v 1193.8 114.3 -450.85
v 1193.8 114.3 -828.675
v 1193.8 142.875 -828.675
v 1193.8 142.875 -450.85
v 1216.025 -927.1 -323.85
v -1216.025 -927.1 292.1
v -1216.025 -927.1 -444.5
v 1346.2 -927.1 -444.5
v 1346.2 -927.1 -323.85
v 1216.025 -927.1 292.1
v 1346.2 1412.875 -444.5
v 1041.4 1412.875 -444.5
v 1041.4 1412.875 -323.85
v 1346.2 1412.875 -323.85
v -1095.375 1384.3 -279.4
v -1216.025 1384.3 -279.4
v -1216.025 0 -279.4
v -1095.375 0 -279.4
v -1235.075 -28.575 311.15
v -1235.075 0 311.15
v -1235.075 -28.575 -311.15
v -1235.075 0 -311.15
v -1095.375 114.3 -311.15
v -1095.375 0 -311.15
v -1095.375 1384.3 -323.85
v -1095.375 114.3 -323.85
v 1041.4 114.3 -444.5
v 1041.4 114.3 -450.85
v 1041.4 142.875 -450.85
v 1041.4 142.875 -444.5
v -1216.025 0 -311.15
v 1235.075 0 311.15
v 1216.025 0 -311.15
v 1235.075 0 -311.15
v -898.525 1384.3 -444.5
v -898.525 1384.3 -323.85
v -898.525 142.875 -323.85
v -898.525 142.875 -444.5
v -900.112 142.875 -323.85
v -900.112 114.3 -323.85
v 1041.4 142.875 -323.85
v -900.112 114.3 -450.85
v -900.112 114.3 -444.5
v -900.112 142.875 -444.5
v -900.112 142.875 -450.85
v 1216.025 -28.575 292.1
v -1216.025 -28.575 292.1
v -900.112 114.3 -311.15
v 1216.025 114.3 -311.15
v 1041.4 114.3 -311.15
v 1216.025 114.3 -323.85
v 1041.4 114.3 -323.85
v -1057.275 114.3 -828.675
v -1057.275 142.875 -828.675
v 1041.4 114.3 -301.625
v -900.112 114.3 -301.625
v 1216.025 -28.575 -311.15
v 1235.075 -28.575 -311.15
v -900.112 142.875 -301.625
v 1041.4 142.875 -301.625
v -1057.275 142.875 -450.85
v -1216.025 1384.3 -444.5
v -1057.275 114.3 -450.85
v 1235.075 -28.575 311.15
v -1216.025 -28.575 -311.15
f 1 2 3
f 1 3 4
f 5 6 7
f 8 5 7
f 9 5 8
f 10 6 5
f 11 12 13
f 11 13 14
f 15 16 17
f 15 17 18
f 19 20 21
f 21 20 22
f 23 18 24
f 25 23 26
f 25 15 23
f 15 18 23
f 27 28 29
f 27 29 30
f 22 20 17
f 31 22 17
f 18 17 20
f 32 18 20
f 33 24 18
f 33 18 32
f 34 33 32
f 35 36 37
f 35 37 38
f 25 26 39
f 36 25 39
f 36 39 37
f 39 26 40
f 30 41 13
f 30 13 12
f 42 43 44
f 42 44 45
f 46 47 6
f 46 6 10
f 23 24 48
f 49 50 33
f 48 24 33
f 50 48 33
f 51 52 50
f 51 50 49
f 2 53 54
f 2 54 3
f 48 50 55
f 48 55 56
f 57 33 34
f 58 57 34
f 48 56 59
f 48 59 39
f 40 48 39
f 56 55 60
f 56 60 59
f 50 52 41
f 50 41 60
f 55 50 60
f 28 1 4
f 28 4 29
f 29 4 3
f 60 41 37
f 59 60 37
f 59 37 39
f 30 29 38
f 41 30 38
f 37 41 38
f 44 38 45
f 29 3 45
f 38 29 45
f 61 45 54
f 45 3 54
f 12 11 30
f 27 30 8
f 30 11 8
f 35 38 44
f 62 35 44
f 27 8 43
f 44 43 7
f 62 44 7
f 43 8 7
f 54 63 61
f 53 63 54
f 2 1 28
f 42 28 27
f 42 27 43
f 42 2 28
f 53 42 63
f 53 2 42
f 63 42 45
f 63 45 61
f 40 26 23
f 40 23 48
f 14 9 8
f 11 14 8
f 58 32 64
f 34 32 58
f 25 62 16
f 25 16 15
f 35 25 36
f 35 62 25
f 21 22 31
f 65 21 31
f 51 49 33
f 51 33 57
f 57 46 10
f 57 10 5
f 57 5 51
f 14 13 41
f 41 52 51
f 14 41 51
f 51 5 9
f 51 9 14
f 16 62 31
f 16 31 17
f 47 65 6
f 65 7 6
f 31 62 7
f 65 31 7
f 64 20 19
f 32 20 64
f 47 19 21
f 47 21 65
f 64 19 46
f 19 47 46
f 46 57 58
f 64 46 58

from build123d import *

# Parameters (mm, degrees)
SKETCH1_W                       = 2470.15
SKETCH1_H                       = 622.3
BOSS_EXTRUDE1_DEPTH             = 28.575
SKETCH2_W                       = 2432.05
SKETCH2_H                       = 736.6
BOSS_EXTRUDE2_DEPTH             = 898.525
SKETCH3_W                       = 2432.05
SKETCH3_H                       = 133.35
BOSS_EXTRUDE3_DEPTH             = 142.875
BOSS_EXTRUDE4_DEPTH             = 28.575
BOSS_EXTRUDE5_DEPTH             = 1270
BOSS_EXTRUDE5_DIRECTION_2_REACH = 1817.661
BOSS_EXTRUDE6_DEPTH             = 1270
BOSS_EXTRUDE6_DEPTH_BACK        = 1069.975
SKETCH6_W                       = 304.8
SKETCH6_H                       = 120.65


with BuildPart() as part:
    # Sketch1 → Boss-Extrude1 (new body)
    with BuildSketch(Plane(origin=(0, 0, 0), x_dir=(1, 0, 0), z_dir=(0, 1, 0))):
        Rectangle(SKETCH1_W, SKETCH1_H)
    extrude(amount=-BOSS_EXTRUDE1_DEPTH)

    # Sketch2 → Boss-Extrude2 (add)
    with BuildSketch(Plane.XZ.offset(28.575)):
        with Locations((0, -76.2)):
            Rectangle(SKETCH2_W, SKETCH2_H)
    extrude(amount=BOSS_EXTRUDE2_DEPTH)

    # Sketch3 → Boss-Extrude3 (add)
    with BuildSketch(Plane(origin=(0, -28.575, 0), x_dir=(1, 0, 0), z_dir=(0, 1, 0))):
        with Locations((0, 377.825)):
            Rectangle(SKETCH3_W, SKETCH3_H)
    extrude(amount=BOSS_EXTRUDE3_DEPTH)

    # Sketch4 → Boss-Extrude4 (add)
    with BuildSketch(Plane(origin=(0, 114.3, 0), x_dir=(1, 0, 0), z_dir=(0, 1, 0))):
        Polygon((-1057.275, 828.675), (1193.8, 828.675), (1193.8, 450.85), (1041.4, 450.85), (1041.4, 301.625), (-900.1125, 301.625), (-900.1125, 450.85), (-1057.275, 450.85), align=None)
    extrude(amount=BOSS_EXTRUDE4_DEPTH)

    # Sketch5 → Boss-Extrude5 (add)
    with BuildSketch(Plane(origin=(0, 114.3, 0), x_dir=(1, 0, 0), z_dir=(0, 1, 0))):
        Polygon((-1216.025, 444.5), (-1216.025, 279.4), (-1095.375, 279.4), (-1095.375, 323.85), (-898.525, 323.85), (-898.525, 444.5), align=None)
    extrude(amount=BOSS_EXTRUDE5_DEPTH)

    # Boss-Extrude5 direction 2: up to this face of the body (flat: up to its plane)
    boss_extrude5_direction_2_end = Plane(part.part.faces().sort_by_distance((0, 0, 0))[0])
    # Sketch5 → Boss-Extrude5 direction 2 (add, up to the picked face)
    with BuildSketch(Plane(origin=(0, 114.3, 0), x_dir=(1, 0, 0), z_dir=(0, 1, 0)), mode=Mode.PRIVATE) as boss_extrude5_direction_2_sk1:
        Polygon((-1216.025, 444.5), (-1216.025, 279.4), (-1095.375, 279.4), (-1095.375, 323.85), (-898.525, 323.85), (-898.525, 444.5), align=None)
    boss_extrude5_direction_2_tool1 = split(extrude(boss_extrude5_direction_2_sk1.sketch, amount=-BOSS_EXTRUDE5_DIRECTION_2_REACH, mode=Mode.PRIVATE), bisect_by=boss_extrude5_direction_2_end, keep=Keep.BOTH, mode=Mode.PRIVATE)
    add(boss_extrude5_direction_2_tool1.solids().sort_by(Axis((-1069.362281, 114.3, -374.037281), (0, -1, 0)))[0])

    # Sketch6 → Boss-Extrude6 (add, two sides: drawn at the far end of the back side and taken through both)
    with BuildSketch(Plane(origin=(0, 142.875, 0), x_dir=(1, 0, 0), z_dir=(0, 1, 0)).offset(-BOSS_EXTRUDE6_DEPTH_BACK)):
        with Locations((1193.8, 384.175)):
            Rectangle(SKETCH6_W, SKETCH6_H)
    extrude(amount=BOSS_EXTRUDE6_DEPTH + BOSS_EXTRUDE6_DEPTH_BACK)


solid = part.part
